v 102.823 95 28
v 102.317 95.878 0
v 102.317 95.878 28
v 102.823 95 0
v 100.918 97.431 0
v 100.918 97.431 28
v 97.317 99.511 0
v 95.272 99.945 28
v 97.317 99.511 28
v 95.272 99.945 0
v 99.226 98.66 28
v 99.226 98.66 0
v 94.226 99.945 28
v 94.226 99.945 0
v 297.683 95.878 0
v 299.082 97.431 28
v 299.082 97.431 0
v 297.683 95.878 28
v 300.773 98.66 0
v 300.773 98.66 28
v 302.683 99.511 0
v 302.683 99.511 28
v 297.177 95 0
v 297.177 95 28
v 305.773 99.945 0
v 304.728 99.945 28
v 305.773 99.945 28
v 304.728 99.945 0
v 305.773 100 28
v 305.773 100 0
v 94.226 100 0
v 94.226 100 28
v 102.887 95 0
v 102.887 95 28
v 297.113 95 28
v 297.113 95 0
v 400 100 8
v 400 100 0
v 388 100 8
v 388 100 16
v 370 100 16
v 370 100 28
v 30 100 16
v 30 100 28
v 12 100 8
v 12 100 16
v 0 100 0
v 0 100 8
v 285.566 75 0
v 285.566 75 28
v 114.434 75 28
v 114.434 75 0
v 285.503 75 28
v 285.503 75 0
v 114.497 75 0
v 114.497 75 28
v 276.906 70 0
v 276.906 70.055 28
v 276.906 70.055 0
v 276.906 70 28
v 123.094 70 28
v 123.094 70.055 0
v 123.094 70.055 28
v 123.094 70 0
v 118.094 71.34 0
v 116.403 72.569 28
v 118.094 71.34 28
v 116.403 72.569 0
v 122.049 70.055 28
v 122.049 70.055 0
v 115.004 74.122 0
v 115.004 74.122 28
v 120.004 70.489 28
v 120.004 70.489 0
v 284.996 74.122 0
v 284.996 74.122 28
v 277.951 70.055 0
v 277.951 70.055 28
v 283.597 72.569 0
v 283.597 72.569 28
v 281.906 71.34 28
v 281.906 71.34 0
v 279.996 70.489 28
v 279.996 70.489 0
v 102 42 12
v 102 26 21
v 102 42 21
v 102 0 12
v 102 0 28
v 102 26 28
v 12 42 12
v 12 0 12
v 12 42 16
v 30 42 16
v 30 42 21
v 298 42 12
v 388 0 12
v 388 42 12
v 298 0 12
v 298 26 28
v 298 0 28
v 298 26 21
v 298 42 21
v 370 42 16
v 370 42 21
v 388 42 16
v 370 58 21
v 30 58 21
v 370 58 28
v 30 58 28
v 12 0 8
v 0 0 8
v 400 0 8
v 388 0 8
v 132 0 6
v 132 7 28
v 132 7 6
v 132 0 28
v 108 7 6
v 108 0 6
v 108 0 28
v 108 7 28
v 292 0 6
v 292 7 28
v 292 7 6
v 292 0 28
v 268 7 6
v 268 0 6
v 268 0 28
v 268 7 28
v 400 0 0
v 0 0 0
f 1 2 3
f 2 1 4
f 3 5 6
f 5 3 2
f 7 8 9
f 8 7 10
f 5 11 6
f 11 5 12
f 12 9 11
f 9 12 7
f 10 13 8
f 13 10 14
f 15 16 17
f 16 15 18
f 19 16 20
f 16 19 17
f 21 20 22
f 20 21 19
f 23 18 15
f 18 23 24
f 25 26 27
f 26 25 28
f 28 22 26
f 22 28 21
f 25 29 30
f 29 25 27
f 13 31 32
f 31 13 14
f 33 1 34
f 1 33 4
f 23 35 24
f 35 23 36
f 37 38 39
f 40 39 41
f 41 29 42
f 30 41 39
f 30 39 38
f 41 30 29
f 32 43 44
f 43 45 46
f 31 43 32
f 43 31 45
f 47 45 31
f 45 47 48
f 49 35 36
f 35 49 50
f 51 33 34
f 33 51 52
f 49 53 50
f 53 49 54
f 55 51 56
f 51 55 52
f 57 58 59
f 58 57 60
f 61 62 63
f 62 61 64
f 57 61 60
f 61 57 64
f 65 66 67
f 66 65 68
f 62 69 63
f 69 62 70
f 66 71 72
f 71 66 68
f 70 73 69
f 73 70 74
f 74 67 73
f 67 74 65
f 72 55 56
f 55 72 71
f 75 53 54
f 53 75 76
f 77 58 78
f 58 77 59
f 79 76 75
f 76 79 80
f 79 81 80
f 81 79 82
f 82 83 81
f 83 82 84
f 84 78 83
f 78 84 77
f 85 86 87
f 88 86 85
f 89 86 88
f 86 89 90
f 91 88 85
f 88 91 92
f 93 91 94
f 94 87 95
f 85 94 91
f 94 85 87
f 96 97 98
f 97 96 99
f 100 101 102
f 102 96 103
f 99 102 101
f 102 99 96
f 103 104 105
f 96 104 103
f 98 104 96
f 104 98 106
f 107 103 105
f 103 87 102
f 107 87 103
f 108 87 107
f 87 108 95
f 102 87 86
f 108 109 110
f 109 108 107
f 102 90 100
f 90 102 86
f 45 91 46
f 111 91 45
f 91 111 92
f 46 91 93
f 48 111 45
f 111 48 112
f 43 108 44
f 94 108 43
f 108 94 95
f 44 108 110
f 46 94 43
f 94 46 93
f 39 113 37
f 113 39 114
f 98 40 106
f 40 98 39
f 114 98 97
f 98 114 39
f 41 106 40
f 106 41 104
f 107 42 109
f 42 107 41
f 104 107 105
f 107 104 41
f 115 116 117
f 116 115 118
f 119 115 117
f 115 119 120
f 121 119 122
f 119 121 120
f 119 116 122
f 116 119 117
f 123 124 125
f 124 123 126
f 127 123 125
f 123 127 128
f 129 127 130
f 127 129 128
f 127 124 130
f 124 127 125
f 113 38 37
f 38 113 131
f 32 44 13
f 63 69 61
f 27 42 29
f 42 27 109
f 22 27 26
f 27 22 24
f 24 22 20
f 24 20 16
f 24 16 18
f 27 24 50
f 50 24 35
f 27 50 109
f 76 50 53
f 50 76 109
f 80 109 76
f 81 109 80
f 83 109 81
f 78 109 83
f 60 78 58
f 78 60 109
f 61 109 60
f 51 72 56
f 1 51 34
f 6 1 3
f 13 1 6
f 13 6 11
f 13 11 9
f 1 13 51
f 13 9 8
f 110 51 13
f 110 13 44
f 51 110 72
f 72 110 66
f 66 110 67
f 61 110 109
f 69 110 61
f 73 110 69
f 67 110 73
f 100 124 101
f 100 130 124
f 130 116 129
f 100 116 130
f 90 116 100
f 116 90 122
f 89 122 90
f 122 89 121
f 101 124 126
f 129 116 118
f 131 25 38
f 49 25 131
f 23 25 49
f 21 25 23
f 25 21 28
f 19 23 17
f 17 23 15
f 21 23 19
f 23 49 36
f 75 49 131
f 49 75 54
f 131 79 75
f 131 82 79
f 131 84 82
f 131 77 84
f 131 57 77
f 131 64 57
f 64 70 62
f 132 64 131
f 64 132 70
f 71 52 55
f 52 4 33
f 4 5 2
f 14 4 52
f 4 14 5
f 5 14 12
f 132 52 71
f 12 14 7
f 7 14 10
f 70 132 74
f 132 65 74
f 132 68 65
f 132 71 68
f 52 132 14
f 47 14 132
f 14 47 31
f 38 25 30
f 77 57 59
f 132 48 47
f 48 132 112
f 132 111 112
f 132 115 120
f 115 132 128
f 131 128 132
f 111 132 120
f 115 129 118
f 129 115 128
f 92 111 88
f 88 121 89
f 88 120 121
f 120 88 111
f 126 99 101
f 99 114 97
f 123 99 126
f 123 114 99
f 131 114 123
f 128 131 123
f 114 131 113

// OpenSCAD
include <../src/wardrobe.scad>;
plank_xz_front_bottom(wardrobe_n);
//github_openscad -o wardrobe_1/plank_xz_front_bottom.stl -D wardrobe_n=1 -D cutting_edge=0 -D break_view_length=0 wardrobe_1/plank_xz_front_bottom_stl.scad
